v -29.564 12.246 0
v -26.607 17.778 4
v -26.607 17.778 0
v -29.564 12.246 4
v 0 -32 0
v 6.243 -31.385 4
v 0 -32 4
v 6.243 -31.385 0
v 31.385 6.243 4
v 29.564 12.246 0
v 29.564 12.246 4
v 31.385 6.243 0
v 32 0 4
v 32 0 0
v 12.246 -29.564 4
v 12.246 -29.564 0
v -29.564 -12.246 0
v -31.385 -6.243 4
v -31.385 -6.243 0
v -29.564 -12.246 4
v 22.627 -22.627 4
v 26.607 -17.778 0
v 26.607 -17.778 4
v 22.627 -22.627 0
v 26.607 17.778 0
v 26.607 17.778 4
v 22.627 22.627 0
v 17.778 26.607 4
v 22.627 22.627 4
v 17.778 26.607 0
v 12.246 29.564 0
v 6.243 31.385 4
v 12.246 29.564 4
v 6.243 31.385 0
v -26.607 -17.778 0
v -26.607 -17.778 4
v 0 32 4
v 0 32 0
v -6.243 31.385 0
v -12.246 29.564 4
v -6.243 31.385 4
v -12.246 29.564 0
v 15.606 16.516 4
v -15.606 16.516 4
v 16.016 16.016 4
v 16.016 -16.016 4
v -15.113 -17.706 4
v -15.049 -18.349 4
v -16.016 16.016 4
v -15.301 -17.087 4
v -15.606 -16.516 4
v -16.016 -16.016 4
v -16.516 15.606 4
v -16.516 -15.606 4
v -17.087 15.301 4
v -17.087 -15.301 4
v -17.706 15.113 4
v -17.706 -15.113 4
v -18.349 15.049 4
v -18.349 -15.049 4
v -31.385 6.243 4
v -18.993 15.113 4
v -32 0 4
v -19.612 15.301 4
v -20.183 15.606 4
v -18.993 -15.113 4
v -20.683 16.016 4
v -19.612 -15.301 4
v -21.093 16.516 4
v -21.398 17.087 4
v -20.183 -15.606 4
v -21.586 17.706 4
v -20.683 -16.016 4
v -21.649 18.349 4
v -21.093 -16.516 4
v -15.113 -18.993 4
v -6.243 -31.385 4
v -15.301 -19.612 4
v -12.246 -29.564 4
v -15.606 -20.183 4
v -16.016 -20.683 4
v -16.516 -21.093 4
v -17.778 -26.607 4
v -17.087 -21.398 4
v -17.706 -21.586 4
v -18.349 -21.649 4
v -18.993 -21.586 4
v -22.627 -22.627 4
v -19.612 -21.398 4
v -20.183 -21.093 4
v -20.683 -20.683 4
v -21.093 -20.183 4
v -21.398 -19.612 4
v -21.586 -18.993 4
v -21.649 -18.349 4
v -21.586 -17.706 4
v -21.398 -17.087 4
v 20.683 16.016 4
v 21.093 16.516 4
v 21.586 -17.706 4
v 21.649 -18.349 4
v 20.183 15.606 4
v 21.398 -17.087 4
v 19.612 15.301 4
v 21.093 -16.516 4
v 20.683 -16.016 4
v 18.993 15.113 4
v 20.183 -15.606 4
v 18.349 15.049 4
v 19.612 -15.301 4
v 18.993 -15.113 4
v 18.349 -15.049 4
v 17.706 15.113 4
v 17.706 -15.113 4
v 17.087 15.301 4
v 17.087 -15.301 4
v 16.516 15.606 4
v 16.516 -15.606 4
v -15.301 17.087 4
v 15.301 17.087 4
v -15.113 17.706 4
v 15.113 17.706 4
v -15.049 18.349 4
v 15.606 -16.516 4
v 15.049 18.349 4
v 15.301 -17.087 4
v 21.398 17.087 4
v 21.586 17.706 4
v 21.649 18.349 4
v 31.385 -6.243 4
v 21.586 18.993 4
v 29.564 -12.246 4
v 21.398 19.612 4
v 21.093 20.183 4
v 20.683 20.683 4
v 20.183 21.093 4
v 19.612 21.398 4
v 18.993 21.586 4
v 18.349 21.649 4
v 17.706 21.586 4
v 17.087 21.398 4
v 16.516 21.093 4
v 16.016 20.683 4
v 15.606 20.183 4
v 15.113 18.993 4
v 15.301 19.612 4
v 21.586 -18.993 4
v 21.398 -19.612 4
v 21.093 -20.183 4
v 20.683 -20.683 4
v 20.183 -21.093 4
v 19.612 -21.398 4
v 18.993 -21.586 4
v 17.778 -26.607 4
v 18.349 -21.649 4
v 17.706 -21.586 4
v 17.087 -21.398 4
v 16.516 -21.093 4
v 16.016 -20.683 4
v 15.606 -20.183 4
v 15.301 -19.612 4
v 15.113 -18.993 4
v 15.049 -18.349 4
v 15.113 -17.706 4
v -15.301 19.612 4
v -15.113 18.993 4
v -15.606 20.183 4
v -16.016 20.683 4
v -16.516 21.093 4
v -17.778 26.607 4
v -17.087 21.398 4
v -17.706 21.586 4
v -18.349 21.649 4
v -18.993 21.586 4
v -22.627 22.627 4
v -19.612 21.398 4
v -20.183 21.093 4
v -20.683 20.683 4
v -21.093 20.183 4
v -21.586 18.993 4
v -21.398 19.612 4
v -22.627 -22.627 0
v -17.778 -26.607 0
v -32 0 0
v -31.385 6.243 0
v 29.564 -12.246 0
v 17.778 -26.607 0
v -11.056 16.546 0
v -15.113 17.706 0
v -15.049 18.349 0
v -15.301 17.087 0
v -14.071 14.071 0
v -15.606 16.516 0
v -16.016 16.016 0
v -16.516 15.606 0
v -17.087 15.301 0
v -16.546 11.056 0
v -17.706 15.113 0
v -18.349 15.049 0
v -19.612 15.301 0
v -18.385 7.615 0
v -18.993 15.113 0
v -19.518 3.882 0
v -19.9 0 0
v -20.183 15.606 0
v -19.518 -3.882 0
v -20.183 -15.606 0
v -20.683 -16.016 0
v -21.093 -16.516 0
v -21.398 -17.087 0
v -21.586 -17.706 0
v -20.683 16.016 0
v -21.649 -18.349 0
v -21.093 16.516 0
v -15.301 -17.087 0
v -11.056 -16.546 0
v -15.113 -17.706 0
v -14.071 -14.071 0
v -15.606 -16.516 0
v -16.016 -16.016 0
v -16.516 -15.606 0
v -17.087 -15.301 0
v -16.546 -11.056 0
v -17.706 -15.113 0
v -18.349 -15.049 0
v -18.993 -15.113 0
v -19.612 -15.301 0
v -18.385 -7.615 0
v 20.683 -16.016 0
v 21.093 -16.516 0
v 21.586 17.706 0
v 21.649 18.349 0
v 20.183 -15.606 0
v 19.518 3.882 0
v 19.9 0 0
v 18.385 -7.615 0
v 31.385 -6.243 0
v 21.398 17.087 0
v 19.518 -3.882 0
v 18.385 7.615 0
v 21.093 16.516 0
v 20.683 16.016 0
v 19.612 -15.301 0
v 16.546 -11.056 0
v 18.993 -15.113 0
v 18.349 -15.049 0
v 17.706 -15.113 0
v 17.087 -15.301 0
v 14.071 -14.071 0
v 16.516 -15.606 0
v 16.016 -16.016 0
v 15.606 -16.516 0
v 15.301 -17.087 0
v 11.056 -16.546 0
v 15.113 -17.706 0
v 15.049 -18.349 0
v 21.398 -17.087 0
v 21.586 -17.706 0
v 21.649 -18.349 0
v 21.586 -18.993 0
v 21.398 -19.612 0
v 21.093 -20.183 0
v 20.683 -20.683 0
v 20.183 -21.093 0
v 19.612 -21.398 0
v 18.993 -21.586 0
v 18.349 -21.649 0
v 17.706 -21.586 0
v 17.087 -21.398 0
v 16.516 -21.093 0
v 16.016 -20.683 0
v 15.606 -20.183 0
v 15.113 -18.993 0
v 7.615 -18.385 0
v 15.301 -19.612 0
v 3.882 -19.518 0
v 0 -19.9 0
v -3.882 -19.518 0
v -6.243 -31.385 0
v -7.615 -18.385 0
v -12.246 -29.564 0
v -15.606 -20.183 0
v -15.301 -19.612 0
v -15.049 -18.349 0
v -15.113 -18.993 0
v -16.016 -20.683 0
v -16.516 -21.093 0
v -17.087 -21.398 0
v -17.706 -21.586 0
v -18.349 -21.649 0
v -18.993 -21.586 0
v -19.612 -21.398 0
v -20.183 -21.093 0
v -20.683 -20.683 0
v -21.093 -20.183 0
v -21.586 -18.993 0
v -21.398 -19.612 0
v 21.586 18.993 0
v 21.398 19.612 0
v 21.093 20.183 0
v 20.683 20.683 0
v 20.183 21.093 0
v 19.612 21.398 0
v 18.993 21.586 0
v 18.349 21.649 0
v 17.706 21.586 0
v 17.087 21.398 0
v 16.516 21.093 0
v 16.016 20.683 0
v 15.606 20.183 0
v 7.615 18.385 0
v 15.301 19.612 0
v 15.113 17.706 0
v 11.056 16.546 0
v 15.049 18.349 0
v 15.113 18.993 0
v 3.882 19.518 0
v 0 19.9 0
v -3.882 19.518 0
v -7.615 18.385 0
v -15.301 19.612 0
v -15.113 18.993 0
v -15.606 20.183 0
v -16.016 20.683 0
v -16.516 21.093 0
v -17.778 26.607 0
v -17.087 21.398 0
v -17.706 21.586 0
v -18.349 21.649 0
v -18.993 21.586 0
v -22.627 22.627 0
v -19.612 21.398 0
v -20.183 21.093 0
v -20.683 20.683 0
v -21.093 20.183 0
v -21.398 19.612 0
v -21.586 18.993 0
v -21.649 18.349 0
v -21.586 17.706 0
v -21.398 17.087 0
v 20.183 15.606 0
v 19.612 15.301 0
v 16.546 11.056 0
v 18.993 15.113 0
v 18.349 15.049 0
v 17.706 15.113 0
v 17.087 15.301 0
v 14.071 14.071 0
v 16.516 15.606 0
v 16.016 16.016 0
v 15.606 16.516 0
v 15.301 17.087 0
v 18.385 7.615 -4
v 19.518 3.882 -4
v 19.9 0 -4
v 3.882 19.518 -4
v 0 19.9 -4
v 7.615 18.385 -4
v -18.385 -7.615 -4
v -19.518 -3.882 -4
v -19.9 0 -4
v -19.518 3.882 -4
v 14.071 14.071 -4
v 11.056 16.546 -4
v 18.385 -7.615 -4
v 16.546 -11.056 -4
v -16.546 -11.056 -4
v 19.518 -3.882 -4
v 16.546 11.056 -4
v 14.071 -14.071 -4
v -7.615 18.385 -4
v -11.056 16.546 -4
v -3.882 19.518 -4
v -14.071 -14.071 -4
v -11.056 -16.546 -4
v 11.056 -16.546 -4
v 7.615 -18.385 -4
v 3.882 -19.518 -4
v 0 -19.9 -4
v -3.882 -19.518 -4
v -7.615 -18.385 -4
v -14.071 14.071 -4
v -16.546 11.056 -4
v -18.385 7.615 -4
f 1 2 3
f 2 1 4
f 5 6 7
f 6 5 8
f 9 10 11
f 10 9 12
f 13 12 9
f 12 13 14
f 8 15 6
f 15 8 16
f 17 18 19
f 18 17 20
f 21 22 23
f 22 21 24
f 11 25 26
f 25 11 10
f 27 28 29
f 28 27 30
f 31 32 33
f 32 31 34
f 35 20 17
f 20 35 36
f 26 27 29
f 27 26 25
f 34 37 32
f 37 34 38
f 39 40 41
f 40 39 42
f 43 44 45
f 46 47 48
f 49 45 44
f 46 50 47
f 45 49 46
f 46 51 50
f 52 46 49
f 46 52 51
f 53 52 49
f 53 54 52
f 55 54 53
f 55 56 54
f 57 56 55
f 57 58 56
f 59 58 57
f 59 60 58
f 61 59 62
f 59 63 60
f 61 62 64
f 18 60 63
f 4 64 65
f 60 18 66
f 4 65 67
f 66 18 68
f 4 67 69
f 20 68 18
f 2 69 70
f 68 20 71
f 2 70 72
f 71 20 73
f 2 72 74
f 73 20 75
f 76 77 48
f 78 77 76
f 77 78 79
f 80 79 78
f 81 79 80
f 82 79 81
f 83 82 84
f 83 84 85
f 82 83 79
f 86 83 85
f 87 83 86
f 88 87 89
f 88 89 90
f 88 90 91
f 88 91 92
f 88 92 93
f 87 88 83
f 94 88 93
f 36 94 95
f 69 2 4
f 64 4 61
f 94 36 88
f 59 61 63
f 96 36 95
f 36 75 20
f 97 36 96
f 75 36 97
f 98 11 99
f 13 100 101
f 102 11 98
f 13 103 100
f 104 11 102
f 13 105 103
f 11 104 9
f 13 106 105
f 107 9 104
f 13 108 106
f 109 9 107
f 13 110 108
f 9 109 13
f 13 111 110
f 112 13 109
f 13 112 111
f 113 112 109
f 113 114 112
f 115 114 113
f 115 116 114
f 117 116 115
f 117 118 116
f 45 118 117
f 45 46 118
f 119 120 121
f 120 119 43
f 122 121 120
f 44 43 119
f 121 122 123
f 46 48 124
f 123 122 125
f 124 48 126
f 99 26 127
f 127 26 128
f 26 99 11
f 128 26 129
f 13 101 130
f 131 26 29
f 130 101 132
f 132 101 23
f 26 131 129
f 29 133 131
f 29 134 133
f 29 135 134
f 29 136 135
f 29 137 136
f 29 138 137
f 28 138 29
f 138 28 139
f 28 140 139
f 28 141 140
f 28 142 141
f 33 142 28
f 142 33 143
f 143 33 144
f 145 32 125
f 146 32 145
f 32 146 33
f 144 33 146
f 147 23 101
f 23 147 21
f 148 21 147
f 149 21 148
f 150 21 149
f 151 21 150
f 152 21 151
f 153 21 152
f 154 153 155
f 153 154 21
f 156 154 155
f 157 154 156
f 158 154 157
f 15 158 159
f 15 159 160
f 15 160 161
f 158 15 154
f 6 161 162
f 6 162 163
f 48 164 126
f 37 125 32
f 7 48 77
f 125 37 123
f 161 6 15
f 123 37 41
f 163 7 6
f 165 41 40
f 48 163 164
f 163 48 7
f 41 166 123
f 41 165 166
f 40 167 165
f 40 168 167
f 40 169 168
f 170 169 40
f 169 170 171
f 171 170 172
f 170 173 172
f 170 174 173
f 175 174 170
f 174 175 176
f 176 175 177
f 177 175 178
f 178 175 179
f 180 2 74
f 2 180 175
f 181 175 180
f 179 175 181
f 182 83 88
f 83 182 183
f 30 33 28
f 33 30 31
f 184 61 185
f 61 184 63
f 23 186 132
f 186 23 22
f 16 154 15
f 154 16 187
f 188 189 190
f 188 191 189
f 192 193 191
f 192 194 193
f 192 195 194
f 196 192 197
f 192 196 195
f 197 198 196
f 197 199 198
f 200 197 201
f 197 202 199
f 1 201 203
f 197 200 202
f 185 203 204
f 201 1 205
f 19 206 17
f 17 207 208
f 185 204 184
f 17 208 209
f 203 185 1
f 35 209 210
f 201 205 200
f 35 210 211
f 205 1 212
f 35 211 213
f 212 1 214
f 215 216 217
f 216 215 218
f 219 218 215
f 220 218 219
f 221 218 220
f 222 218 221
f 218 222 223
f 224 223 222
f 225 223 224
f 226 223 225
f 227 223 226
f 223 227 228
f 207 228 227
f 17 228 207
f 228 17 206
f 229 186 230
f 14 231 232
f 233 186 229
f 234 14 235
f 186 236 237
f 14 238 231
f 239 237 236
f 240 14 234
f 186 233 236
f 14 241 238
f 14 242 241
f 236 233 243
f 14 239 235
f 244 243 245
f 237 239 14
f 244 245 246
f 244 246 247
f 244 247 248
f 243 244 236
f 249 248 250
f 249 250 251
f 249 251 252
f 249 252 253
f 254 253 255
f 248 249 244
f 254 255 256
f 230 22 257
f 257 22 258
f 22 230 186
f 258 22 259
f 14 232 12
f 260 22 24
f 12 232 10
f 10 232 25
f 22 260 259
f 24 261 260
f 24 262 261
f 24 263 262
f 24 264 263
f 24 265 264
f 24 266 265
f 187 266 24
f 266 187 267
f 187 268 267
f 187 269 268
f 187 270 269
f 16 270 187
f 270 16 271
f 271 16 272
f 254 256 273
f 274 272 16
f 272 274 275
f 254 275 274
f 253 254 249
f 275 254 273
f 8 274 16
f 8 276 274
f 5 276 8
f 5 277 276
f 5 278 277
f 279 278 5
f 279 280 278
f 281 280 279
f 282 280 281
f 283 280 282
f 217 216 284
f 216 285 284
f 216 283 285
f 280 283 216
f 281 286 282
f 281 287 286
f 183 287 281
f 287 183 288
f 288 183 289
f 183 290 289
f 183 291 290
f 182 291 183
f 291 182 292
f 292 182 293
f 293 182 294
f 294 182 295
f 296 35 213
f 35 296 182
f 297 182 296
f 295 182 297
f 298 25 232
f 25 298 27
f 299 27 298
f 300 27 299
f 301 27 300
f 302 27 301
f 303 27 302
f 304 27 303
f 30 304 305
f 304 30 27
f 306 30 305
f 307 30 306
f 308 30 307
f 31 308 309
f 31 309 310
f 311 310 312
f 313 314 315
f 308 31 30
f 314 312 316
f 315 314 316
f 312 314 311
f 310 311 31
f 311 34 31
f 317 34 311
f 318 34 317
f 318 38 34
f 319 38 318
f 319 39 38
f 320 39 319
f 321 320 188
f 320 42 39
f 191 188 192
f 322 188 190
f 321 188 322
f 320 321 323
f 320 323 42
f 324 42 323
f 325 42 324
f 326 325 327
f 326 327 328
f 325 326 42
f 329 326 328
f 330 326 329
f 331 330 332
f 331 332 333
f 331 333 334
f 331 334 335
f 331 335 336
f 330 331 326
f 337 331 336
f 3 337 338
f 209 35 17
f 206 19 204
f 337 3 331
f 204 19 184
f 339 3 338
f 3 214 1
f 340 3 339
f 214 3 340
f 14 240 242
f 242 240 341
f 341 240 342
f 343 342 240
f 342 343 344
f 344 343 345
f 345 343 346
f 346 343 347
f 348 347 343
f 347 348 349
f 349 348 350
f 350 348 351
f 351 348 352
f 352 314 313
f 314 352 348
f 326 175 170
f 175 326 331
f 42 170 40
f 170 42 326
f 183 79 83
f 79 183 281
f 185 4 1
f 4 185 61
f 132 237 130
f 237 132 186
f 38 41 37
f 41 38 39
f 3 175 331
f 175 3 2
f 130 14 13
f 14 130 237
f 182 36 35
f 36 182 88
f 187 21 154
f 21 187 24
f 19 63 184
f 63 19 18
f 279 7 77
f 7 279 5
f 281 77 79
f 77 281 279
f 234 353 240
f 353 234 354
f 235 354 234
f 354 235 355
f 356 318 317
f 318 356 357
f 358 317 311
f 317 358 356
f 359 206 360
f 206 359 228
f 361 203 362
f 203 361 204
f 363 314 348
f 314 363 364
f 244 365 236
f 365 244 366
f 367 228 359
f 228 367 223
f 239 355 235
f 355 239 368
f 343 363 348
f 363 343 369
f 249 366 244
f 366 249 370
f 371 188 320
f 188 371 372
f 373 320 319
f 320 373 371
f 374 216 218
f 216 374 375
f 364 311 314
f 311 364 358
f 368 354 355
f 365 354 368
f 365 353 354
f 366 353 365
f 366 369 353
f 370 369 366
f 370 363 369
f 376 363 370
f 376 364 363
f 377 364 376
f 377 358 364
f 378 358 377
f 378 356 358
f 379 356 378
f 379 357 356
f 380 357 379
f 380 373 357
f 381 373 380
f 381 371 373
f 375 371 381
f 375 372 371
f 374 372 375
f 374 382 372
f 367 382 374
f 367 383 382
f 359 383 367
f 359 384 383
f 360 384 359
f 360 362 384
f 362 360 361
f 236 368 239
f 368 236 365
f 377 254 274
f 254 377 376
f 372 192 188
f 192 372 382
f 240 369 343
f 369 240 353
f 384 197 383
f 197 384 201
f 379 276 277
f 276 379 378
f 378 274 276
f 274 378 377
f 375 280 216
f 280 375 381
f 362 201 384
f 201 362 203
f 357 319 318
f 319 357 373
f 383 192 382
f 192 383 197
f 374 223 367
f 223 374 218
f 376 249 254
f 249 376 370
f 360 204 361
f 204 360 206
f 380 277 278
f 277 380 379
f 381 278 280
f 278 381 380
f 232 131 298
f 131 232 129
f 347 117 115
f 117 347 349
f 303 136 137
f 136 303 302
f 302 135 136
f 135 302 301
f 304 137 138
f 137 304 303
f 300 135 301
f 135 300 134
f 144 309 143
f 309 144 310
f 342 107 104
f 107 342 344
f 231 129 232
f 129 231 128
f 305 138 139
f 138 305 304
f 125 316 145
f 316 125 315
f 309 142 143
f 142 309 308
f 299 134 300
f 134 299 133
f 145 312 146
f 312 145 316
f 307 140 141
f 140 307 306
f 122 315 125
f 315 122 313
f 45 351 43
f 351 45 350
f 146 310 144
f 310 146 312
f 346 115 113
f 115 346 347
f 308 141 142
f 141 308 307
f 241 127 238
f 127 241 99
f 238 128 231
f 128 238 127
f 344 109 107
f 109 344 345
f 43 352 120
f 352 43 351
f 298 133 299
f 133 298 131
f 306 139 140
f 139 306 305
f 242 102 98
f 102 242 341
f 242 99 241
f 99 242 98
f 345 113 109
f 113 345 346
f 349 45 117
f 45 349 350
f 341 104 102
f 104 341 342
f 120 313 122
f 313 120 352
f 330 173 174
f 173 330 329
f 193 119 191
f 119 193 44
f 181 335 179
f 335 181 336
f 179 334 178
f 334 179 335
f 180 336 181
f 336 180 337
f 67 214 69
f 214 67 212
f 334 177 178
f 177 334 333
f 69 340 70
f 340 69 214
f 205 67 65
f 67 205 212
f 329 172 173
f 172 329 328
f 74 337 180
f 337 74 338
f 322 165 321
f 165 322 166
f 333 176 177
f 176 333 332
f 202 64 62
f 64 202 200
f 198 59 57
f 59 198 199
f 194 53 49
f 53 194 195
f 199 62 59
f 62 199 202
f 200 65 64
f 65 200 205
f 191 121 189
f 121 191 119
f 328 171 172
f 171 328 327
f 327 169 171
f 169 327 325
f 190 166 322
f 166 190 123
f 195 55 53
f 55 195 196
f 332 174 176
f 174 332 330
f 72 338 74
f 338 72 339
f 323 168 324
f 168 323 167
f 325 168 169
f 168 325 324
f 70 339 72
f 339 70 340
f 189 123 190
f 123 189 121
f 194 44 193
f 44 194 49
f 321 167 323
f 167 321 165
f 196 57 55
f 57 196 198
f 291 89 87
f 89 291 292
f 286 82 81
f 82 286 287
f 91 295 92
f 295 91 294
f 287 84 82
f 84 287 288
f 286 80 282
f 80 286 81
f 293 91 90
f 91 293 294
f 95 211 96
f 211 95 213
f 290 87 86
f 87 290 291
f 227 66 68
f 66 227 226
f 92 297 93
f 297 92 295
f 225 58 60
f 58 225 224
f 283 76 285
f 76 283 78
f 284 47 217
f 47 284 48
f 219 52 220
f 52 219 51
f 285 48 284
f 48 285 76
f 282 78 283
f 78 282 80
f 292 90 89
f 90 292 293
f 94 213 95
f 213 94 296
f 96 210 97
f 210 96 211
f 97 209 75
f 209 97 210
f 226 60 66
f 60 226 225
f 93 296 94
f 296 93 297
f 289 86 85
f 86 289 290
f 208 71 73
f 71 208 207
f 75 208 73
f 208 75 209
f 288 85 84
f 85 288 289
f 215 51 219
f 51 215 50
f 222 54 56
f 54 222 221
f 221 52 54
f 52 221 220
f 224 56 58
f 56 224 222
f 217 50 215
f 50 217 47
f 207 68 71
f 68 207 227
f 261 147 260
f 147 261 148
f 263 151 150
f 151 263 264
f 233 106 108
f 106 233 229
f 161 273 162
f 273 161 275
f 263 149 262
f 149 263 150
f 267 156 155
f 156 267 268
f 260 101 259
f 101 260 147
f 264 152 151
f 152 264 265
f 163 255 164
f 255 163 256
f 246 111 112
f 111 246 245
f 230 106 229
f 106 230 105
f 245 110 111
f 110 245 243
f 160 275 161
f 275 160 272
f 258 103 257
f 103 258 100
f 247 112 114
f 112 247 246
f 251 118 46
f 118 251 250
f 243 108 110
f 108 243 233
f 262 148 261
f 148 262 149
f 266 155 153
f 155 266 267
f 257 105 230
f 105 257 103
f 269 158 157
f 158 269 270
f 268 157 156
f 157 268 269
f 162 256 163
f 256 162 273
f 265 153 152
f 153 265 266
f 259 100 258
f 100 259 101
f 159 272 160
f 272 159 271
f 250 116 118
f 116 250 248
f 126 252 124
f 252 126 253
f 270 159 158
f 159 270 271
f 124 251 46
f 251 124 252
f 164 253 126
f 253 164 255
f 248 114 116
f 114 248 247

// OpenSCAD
$fn = 32;

// ----------------------------------------------------------------------
// Retaining cap: 6203 cover, 64 mm, spigot 39.8 mm
// ----------------------------------------------------------------------

// --- parameters (mm) ---
cover_d = 64;             // cover diameter
cover_t = 4;              // cover thickness
spigot_d = 39.8;          // spigot that enters the housing
spigot_h = 4;             // spigot height
bolt_d = 6.6;             // bolt clearance
bolt_r = 25.95;           // bolt circle radius

module cover() {
  cylinder(h = cover_t, d = cover_d);
}

module spigot() {
  /* sunk 1 mm into the cover; the spigot sets the overall height */
  translate([0, 0, -spigot_h]) cylinder(h = spigot_h + 1, d = spigot_d);
}

difference() {
  union() {
    cover();
    spigot();
  }
  for (i = [0 : 3]) rotate([0, 0, 45 + i * 90]) translate([bolt_r, 0, -spigot_h - 1])
    cylinder(h = spigot_h + cover_t + 2, d = bolt_d);
}
